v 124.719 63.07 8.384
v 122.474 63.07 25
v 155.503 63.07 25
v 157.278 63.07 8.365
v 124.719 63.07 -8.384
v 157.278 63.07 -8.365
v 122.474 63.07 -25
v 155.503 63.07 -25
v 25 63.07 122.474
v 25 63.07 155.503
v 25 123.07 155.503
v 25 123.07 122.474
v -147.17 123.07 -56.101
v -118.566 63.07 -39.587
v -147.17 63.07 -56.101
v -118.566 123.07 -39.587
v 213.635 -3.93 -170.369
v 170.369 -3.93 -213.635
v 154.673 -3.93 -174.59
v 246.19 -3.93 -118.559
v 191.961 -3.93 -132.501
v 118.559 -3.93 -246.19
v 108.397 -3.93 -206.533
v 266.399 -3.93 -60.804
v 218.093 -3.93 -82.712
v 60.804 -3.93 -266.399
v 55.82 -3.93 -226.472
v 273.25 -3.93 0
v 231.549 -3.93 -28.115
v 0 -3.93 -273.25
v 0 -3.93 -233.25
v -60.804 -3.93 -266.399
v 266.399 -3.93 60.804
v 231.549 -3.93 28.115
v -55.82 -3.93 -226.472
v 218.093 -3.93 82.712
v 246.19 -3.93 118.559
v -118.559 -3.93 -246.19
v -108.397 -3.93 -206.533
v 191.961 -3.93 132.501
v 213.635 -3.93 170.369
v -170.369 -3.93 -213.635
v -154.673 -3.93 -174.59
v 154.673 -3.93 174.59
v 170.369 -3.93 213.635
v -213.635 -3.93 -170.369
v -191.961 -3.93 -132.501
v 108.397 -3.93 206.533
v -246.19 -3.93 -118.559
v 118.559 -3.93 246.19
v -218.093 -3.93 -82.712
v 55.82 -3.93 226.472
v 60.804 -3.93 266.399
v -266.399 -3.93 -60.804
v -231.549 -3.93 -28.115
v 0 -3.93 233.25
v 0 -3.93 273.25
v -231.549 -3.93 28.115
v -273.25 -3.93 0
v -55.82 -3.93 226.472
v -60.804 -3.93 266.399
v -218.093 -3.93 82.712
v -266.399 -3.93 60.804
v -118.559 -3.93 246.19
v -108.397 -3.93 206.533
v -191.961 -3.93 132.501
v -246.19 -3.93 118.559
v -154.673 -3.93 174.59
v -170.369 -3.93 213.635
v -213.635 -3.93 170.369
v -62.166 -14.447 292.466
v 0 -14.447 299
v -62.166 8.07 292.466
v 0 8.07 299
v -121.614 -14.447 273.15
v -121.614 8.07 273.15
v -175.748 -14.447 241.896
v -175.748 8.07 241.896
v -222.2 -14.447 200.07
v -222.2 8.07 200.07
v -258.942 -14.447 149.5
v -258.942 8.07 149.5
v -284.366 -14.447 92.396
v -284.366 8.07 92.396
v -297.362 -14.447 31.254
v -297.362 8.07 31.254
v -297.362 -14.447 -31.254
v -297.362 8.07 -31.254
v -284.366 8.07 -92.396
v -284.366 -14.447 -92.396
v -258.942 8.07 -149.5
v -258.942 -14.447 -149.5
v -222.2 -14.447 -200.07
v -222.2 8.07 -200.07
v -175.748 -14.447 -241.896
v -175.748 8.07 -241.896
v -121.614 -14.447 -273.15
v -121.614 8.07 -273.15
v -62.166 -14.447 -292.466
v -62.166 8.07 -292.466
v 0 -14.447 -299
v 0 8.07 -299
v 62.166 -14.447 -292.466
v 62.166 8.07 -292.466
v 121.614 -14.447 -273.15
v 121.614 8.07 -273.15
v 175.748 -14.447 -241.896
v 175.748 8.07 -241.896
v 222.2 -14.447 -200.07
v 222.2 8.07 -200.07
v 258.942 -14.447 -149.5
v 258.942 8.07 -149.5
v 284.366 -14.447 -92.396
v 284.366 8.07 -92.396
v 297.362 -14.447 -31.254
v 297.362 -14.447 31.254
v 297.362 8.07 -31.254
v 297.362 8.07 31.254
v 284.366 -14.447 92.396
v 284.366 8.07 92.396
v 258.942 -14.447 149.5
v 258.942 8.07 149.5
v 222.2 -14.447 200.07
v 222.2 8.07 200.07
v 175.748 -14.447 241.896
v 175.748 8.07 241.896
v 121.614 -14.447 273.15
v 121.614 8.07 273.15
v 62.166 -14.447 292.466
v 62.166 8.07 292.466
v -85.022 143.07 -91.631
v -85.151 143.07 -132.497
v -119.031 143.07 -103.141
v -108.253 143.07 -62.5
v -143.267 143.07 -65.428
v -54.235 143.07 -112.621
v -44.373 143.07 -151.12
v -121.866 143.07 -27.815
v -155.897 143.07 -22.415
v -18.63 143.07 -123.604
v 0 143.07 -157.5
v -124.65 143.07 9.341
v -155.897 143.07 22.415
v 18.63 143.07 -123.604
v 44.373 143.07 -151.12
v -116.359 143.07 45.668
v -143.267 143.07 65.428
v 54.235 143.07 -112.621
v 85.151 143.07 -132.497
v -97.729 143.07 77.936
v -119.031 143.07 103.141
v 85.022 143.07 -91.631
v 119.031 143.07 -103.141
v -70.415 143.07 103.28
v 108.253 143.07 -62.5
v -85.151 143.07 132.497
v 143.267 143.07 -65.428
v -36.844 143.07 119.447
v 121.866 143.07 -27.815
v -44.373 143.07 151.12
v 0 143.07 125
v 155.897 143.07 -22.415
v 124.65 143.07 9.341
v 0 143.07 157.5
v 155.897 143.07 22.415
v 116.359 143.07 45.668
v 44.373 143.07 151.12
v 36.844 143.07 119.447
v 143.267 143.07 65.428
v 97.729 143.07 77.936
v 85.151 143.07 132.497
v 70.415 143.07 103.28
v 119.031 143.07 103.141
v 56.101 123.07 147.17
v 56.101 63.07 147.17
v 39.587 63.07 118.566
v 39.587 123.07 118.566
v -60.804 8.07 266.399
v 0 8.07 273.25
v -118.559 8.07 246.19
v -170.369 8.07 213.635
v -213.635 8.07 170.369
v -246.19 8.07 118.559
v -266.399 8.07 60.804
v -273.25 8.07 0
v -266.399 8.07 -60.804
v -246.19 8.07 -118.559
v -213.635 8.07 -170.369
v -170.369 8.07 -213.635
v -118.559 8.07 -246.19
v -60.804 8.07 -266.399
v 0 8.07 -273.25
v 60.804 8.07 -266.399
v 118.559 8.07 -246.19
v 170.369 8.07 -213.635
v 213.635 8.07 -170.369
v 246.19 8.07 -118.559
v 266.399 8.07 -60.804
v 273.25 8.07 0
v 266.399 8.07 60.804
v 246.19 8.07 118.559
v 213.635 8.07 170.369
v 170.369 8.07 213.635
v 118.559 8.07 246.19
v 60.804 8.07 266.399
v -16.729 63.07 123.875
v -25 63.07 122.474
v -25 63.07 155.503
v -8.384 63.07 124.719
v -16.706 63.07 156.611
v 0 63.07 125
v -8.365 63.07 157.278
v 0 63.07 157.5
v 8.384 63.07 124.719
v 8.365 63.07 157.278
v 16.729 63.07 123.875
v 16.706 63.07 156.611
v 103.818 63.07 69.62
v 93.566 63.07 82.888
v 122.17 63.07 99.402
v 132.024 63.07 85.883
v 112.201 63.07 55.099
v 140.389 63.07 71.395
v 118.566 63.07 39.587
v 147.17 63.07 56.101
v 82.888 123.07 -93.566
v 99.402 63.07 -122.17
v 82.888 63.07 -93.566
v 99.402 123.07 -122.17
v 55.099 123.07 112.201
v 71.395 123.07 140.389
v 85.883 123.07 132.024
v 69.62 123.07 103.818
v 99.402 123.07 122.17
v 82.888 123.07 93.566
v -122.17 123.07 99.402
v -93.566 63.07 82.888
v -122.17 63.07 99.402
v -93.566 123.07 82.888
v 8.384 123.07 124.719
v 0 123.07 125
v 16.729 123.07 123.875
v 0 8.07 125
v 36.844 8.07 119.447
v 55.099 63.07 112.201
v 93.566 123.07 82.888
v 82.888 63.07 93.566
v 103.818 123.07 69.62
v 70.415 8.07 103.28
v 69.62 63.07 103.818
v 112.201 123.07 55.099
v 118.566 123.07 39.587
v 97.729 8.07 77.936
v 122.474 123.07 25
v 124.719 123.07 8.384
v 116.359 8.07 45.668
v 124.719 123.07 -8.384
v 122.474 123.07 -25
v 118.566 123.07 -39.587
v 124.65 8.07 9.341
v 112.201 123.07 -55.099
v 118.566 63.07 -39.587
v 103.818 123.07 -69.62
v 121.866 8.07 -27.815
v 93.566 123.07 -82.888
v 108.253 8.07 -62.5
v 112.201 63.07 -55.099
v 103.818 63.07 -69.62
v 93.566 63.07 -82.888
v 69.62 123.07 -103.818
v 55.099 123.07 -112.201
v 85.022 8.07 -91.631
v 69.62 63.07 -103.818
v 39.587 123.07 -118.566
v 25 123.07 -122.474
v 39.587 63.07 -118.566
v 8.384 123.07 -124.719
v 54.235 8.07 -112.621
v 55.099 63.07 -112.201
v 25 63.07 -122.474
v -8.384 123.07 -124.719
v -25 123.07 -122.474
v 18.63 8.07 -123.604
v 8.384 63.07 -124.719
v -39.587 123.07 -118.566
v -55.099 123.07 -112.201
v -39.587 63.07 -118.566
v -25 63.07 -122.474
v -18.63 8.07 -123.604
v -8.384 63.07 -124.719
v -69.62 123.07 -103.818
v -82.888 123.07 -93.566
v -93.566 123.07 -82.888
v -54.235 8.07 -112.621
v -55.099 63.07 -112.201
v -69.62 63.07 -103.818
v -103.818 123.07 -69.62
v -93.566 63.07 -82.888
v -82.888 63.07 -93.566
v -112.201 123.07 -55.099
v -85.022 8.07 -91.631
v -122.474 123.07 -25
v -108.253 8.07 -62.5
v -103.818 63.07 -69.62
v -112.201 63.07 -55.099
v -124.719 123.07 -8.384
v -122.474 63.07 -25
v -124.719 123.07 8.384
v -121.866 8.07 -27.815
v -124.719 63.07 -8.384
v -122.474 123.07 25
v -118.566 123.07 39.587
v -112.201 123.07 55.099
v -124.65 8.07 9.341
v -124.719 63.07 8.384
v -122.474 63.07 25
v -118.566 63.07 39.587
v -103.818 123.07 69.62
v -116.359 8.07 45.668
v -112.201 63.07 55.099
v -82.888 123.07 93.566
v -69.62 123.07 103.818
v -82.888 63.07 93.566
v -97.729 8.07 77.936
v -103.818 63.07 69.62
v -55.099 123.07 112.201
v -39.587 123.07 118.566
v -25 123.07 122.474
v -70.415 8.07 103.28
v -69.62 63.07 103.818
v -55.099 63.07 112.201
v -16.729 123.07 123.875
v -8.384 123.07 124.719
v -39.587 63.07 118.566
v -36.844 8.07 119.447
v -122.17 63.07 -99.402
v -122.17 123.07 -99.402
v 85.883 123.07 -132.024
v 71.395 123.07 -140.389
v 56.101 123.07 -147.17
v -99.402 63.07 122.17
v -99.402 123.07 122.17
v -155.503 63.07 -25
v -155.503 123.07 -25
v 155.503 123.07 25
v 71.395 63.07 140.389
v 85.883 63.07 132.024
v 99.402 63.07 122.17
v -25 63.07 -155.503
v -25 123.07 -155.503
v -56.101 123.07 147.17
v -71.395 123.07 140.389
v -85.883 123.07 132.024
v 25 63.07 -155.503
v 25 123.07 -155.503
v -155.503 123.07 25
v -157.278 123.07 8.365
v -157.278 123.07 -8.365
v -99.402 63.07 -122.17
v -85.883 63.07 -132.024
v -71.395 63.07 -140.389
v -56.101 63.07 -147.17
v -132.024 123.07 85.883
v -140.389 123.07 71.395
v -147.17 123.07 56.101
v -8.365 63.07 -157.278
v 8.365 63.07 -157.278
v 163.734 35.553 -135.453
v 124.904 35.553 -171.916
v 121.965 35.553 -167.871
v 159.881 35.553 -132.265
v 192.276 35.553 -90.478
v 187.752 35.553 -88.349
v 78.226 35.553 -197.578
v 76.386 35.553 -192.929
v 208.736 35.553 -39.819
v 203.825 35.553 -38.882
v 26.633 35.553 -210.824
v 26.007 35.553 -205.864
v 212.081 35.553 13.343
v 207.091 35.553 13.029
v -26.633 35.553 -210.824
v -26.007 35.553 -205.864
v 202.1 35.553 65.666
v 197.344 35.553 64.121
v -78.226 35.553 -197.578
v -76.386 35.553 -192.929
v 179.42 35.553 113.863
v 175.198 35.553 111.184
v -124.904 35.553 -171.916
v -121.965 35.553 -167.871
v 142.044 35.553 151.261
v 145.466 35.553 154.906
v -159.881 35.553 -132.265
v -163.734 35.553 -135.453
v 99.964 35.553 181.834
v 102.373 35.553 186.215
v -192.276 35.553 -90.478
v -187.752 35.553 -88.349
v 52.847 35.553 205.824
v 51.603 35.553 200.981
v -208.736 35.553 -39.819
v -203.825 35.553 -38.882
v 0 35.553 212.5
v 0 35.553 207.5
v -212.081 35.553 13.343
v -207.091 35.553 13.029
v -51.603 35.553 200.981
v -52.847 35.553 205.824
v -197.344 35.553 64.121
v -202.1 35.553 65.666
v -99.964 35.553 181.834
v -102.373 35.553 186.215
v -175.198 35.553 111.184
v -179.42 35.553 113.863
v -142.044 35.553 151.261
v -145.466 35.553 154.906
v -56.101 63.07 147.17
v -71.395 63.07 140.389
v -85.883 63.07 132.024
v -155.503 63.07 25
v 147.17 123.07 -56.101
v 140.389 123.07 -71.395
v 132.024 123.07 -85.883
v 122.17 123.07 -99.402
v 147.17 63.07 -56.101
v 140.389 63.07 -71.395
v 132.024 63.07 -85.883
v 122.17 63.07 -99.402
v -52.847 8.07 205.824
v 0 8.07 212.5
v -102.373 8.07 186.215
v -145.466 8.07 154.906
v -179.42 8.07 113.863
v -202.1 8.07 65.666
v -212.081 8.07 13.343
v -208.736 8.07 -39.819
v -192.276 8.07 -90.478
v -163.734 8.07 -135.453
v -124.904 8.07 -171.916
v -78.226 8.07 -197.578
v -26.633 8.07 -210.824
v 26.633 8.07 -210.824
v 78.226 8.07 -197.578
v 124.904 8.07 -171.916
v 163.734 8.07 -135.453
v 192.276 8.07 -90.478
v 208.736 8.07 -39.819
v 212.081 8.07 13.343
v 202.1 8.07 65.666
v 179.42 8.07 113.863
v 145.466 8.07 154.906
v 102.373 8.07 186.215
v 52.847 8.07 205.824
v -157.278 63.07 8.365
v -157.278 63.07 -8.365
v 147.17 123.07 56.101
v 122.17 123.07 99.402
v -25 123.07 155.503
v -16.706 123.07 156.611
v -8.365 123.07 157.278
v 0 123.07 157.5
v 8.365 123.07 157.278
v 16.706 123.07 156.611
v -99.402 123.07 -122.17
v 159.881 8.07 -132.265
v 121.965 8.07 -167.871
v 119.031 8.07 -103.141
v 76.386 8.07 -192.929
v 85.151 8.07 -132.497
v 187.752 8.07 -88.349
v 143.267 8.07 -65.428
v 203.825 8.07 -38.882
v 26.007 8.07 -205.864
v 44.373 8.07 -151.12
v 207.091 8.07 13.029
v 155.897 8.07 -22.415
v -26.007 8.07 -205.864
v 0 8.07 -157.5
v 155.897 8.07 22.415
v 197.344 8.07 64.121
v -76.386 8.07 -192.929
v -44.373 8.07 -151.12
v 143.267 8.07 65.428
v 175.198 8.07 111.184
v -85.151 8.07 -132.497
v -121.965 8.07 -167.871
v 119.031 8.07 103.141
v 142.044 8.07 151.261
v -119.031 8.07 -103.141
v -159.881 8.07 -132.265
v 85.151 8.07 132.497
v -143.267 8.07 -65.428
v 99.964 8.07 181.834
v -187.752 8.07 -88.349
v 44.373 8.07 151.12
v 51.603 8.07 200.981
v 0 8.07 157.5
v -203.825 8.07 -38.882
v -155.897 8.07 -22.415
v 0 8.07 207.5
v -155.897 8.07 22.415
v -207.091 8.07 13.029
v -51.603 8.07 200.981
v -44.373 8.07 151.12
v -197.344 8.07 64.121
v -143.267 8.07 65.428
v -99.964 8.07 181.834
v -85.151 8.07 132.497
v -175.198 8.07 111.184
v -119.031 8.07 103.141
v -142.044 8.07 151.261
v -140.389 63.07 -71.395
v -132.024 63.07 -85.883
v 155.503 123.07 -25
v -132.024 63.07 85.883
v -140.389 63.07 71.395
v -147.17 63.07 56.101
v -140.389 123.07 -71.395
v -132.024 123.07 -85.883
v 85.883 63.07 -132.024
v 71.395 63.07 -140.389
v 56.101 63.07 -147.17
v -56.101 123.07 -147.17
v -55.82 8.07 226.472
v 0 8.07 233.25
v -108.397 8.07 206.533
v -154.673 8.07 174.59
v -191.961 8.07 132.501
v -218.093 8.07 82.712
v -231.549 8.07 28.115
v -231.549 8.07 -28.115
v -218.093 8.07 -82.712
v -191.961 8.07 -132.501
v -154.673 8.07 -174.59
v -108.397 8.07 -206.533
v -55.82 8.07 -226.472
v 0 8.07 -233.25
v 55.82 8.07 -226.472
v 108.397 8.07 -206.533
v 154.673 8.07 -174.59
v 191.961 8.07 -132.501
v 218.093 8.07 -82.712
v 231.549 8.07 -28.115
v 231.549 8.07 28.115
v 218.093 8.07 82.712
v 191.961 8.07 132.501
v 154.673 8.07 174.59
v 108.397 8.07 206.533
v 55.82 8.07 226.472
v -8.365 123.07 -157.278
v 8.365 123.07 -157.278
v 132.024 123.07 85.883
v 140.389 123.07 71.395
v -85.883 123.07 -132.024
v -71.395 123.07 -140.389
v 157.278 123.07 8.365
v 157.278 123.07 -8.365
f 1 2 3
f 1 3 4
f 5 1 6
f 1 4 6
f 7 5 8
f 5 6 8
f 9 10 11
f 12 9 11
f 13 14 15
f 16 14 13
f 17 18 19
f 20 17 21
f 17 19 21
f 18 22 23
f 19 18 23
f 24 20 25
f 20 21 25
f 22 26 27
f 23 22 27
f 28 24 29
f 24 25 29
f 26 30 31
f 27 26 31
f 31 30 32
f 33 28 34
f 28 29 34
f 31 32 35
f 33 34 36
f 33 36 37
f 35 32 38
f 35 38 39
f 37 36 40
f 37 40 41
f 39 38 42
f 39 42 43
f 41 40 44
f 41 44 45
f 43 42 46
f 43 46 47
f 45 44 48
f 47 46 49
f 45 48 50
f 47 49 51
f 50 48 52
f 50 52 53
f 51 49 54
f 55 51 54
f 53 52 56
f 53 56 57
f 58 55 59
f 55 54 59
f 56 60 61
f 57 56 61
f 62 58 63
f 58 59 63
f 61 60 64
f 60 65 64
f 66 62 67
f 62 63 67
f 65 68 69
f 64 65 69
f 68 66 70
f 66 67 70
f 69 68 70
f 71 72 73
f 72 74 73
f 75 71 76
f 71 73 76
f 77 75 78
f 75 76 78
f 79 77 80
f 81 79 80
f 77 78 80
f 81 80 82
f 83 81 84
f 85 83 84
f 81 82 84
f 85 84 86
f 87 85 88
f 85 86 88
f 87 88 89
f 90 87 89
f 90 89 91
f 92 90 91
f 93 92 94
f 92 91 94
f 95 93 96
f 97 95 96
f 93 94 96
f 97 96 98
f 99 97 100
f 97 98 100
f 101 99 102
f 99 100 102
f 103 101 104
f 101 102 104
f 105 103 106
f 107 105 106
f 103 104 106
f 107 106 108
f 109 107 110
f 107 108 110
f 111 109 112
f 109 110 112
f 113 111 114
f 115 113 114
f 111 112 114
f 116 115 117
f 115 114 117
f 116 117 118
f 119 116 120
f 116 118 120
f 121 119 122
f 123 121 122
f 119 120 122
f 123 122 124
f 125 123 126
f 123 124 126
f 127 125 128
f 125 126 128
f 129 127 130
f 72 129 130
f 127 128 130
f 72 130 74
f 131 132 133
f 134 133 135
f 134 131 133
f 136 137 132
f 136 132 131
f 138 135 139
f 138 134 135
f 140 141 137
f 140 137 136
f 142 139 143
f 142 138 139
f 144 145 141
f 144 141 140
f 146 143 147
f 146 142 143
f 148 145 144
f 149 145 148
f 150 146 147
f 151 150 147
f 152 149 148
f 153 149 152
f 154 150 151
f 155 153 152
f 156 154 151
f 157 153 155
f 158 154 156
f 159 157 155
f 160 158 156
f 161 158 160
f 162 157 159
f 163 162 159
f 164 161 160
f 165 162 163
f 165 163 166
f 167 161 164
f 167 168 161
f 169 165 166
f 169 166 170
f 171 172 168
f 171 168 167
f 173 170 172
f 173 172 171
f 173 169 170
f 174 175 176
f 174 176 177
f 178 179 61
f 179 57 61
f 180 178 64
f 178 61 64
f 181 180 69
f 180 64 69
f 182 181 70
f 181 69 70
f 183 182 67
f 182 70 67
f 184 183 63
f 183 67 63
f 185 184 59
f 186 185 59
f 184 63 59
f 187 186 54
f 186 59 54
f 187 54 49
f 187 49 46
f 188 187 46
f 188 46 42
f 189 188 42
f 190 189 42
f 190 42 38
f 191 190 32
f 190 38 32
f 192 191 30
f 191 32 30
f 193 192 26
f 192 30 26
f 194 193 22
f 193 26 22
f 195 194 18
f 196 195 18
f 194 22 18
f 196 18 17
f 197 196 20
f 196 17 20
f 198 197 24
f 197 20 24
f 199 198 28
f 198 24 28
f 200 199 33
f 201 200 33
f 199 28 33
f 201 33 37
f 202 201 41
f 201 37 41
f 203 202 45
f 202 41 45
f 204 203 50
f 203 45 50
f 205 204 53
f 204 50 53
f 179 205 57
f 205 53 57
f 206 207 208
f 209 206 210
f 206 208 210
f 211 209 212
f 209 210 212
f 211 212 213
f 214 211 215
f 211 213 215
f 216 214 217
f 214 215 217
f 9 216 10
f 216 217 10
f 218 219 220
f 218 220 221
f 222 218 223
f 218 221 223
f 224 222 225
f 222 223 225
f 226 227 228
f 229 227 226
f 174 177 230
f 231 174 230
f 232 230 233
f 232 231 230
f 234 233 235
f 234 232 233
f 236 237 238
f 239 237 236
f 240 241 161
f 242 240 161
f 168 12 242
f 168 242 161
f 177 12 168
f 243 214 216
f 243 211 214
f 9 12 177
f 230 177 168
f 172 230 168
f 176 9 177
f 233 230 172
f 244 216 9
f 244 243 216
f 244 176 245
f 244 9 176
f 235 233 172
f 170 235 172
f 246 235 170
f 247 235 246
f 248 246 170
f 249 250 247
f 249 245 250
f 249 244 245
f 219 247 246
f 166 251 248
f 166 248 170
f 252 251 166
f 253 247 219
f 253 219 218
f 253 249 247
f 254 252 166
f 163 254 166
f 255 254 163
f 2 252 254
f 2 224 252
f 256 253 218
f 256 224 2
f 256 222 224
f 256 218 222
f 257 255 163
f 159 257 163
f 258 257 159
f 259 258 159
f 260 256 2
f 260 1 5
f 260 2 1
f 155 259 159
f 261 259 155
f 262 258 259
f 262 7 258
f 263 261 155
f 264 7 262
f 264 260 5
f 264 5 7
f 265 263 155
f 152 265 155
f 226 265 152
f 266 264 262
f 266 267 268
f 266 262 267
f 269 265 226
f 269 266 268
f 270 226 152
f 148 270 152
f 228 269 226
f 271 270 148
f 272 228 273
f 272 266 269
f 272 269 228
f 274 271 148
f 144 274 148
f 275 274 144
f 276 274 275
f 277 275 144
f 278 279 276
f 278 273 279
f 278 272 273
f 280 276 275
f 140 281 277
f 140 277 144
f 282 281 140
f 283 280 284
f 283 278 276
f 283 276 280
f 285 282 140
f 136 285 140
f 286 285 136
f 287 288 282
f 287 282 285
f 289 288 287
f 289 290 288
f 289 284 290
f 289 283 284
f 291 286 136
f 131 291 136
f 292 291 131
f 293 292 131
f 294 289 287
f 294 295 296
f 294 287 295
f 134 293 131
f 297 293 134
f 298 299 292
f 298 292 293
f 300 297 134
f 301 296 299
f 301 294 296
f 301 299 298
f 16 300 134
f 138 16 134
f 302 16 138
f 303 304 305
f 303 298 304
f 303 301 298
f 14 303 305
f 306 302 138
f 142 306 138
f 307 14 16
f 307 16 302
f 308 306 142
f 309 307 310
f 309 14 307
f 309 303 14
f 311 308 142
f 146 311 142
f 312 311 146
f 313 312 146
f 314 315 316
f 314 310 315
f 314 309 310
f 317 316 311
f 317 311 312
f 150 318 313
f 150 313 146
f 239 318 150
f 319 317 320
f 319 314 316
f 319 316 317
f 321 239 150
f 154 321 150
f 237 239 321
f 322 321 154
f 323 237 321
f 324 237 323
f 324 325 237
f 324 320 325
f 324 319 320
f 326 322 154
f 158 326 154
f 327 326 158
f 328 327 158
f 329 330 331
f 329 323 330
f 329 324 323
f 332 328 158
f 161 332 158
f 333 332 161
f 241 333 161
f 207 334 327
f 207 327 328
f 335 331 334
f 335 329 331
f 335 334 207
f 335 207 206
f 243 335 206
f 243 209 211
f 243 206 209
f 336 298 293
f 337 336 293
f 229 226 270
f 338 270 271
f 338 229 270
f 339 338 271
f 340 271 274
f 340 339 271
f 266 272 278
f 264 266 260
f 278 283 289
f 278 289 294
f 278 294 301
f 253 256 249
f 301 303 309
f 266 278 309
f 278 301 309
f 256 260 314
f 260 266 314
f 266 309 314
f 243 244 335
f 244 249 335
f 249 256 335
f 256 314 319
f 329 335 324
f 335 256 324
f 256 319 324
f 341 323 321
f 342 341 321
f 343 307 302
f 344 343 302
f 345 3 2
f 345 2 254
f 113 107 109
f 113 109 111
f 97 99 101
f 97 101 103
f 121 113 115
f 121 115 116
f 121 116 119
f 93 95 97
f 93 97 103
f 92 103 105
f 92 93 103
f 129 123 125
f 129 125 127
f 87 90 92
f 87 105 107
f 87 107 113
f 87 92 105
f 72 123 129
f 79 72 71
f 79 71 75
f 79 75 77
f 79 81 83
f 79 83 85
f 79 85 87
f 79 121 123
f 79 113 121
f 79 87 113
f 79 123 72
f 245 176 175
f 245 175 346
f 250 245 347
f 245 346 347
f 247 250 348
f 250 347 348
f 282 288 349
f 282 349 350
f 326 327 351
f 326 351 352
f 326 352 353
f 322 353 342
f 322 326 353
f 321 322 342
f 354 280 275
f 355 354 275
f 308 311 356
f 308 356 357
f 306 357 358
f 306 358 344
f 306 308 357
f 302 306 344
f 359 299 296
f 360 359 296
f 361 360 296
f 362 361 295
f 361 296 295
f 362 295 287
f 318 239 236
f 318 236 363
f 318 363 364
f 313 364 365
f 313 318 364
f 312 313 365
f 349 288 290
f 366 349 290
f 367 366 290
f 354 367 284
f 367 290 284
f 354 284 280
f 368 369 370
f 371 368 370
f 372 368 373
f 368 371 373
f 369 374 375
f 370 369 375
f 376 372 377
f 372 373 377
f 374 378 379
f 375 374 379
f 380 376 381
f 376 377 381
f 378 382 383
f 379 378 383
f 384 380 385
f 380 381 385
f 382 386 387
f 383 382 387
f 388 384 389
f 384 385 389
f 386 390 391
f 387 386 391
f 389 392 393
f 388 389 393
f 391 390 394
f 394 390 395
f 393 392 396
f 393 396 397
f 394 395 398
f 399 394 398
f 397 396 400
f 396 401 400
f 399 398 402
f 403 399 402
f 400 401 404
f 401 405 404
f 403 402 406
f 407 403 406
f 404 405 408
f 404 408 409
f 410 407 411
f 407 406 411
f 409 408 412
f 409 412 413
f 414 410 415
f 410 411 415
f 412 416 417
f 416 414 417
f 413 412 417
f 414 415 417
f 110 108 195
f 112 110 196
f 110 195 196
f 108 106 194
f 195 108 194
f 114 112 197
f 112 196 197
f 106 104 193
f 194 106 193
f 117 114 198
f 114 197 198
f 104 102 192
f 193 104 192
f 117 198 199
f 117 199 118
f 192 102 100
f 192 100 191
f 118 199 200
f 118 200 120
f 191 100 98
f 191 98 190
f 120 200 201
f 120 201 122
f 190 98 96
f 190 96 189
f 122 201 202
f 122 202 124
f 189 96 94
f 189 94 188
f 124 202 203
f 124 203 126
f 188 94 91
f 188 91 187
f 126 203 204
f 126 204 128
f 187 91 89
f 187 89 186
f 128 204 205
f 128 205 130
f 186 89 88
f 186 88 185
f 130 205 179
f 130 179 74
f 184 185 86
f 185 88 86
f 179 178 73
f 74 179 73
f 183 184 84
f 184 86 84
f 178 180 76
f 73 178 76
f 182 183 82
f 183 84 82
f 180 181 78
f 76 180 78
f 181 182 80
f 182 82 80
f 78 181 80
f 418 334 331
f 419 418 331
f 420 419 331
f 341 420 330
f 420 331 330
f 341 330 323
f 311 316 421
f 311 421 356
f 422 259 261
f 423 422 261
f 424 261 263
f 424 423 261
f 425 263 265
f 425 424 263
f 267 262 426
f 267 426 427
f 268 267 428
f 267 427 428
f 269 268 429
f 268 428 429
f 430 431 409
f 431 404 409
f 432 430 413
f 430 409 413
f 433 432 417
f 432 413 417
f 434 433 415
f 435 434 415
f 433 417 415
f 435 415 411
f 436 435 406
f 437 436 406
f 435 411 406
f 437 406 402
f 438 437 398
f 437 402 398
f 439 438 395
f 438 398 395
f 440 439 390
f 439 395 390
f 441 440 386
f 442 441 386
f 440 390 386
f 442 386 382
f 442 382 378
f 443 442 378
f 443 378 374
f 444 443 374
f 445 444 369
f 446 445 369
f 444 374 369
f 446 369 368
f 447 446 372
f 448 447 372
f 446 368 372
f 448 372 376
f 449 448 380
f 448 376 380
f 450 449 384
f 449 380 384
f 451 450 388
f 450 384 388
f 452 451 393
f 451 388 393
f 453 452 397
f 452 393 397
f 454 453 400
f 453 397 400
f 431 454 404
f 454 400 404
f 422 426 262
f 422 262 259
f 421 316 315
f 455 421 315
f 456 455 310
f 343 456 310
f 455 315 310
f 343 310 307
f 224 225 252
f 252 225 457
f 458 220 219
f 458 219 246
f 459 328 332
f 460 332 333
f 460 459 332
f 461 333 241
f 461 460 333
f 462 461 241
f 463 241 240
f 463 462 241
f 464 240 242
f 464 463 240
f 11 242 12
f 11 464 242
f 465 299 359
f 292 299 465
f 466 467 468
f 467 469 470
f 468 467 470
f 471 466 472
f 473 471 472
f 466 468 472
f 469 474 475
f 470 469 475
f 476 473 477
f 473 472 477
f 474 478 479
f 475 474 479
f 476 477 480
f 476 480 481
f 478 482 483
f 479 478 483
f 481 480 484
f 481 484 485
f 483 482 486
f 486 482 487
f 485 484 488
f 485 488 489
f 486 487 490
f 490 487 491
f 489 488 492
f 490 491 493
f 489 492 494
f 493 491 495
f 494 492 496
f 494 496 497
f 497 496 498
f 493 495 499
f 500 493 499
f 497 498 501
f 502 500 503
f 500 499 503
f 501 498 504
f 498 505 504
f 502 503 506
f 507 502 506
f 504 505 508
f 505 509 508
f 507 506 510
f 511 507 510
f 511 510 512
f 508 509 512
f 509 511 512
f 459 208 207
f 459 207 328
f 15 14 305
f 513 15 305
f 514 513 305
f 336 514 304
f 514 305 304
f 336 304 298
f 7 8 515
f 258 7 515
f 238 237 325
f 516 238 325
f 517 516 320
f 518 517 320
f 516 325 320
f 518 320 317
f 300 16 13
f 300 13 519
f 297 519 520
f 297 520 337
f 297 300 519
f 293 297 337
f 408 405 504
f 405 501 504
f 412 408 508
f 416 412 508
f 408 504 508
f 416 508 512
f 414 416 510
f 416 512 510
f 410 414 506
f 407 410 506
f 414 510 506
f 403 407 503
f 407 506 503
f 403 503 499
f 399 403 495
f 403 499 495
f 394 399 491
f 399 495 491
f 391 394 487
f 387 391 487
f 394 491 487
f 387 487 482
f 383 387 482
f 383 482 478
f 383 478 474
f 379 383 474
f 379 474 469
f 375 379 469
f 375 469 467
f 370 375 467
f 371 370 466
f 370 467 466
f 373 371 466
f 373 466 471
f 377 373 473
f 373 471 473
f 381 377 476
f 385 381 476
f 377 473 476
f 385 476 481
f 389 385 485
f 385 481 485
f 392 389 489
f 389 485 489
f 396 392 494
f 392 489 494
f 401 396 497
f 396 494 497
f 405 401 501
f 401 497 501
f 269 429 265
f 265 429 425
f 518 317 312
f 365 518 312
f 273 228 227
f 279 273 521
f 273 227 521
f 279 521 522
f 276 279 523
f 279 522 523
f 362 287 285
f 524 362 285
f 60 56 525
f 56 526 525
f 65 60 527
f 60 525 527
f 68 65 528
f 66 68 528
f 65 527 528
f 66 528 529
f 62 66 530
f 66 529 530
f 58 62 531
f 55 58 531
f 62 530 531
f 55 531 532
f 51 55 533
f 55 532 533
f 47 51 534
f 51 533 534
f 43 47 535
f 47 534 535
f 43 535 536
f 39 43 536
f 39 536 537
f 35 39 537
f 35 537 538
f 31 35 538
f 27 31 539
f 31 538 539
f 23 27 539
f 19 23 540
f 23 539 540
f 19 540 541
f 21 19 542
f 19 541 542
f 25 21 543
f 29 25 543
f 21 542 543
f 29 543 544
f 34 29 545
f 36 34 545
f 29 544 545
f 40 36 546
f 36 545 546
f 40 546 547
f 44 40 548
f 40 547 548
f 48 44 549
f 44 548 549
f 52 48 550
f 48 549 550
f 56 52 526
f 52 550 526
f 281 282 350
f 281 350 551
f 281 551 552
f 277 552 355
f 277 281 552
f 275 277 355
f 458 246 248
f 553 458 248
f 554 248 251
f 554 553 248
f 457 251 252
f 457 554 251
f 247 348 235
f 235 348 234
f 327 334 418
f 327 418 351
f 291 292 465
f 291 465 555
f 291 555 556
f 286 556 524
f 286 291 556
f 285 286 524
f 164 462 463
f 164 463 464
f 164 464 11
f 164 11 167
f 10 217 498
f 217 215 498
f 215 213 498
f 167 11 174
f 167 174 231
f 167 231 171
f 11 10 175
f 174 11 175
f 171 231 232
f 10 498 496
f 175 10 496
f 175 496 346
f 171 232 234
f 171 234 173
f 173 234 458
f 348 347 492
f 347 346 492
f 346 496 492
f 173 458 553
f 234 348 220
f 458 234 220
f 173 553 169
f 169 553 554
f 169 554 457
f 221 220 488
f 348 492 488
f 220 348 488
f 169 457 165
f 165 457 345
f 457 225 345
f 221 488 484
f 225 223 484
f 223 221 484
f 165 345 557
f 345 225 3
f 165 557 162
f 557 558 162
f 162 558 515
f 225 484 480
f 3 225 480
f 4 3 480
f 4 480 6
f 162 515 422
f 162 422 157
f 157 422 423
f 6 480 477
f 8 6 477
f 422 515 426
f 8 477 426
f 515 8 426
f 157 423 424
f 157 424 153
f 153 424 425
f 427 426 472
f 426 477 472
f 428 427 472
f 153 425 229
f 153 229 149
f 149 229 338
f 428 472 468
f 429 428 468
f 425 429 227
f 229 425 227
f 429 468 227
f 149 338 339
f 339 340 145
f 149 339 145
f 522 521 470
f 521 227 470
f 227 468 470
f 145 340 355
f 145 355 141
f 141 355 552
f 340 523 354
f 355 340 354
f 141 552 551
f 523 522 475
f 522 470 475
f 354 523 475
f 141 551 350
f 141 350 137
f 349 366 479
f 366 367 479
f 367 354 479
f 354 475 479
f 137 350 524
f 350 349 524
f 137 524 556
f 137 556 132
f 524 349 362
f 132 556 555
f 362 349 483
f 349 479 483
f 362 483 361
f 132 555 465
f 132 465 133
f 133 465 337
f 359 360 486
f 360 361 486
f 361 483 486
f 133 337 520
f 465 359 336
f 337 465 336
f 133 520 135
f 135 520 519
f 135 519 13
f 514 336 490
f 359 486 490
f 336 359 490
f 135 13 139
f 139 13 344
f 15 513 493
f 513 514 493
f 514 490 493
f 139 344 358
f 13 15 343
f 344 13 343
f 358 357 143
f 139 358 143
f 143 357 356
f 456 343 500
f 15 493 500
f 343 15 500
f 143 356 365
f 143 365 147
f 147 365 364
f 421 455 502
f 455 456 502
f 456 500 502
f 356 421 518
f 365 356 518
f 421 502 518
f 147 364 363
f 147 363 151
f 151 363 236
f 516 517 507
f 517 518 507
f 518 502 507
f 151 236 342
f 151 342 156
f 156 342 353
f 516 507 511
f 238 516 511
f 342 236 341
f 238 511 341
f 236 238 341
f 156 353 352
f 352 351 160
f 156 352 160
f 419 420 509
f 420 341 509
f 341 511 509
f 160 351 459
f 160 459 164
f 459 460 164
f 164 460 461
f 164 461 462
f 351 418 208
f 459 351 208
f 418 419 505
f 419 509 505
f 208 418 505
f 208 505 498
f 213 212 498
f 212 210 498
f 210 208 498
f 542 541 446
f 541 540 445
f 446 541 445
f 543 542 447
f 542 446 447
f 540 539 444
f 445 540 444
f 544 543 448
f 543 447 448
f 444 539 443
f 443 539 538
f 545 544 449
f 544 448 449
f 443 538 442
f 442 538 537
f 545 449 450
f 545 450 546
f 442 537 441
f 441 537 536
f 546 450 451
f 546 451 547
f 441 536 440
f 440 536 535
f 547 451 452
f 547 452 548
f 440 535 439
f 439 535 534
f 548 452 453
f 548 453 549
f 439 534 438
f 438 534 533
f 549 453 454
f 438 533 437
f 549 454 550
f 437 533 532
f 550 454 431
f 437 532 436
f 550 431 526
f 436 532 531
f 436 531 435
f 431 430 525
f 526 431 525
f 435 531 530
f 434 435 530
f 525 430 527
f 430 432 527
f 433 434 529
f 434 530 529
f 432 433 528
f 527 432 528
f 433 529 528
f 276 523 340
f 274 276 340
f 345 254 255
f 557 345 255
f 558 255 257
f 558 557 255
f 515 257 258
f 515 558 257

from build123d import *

# Parameters (mm, degrees)
SKETCH4_R           = 157.5
SKETCH4_R_2         = 125
BOSS_EXTRUDE1_DEPTH = 135
SKETCH5_W           = 50
SKETCH5_H           = 60
CUT_EXTRUDE1_DEPTH  = 447.397941427
CIRPATTERN1_COUNT   = 12


with BuildPart() as part:
    # Sketch3 → Revolve1 (revolve)
    with BuildSketch(Plane(origin=(0, 0, 0), x_dir=(0, 0, -1), z_dir=(1, 0, 0))):
        Polygon((-212.5, 8.070339729), (-212.5, 35.553232656), (-207.5, 35.553232656), (-207.5, 8.070339729), (0, 8.070339729), (0, -14.446767344), (-207.5, -14.446767344), (-299, -14.446767344), (-299, 8.070339729), (-273.25, 8.070339729), (-273.25, -3.929660271), (-233.25, -3.929660271), (-233.25, 8.070339729), align=None)
    revolve(axis=Axis((0, 120.738006406, 0), (0, -1, 0)))

    # Sketch4 → Boss-Extrude1 (add)
    with BuildSketch(Plane(origin=(0, 8.070339729, 0), x_dir=(1, 0, 0), z_dir=(0, 1, 0))):
        with Locations(Location((0, 0, 0), (0, 0, 270))):
            Circle(SKETCH4_R)
        with Locations(Location((0, 0, 0), (0, 0, 270))):
            Circle(SKETCH4_R_2, mode=Mode.SUBTRACT)
    extrude(amount=BOSS_EXTRUDE1_DEPTH)

    # Sketch5 → Cut-Extrude1 (cut, symmetric)
    with BuildSketch(Plane.XY):
        with Locations((0, 93.070339729)):
            Rectangle(SKETCH5_W, SKETCH5_H)
    cut_extrude1 = extrude(amount=CUT_EXTRUDE1_DEPTH, both=True, mode=Mode.SUBTRACT)

    # CirPattern1: Cut-Extrude1 ×12 about axis
    cirpattern1_axis = Axis((0, 0, 0), (0, 1, 0))
    for i in range(1, CIRPATTERN1_COUNT):
        add(cut_extrude1.rotate(cirpattern1_axis, i * 360 / CIRPATTERN1_COUNT), mode=Mode.SUBTRACT)


solid = part.part
